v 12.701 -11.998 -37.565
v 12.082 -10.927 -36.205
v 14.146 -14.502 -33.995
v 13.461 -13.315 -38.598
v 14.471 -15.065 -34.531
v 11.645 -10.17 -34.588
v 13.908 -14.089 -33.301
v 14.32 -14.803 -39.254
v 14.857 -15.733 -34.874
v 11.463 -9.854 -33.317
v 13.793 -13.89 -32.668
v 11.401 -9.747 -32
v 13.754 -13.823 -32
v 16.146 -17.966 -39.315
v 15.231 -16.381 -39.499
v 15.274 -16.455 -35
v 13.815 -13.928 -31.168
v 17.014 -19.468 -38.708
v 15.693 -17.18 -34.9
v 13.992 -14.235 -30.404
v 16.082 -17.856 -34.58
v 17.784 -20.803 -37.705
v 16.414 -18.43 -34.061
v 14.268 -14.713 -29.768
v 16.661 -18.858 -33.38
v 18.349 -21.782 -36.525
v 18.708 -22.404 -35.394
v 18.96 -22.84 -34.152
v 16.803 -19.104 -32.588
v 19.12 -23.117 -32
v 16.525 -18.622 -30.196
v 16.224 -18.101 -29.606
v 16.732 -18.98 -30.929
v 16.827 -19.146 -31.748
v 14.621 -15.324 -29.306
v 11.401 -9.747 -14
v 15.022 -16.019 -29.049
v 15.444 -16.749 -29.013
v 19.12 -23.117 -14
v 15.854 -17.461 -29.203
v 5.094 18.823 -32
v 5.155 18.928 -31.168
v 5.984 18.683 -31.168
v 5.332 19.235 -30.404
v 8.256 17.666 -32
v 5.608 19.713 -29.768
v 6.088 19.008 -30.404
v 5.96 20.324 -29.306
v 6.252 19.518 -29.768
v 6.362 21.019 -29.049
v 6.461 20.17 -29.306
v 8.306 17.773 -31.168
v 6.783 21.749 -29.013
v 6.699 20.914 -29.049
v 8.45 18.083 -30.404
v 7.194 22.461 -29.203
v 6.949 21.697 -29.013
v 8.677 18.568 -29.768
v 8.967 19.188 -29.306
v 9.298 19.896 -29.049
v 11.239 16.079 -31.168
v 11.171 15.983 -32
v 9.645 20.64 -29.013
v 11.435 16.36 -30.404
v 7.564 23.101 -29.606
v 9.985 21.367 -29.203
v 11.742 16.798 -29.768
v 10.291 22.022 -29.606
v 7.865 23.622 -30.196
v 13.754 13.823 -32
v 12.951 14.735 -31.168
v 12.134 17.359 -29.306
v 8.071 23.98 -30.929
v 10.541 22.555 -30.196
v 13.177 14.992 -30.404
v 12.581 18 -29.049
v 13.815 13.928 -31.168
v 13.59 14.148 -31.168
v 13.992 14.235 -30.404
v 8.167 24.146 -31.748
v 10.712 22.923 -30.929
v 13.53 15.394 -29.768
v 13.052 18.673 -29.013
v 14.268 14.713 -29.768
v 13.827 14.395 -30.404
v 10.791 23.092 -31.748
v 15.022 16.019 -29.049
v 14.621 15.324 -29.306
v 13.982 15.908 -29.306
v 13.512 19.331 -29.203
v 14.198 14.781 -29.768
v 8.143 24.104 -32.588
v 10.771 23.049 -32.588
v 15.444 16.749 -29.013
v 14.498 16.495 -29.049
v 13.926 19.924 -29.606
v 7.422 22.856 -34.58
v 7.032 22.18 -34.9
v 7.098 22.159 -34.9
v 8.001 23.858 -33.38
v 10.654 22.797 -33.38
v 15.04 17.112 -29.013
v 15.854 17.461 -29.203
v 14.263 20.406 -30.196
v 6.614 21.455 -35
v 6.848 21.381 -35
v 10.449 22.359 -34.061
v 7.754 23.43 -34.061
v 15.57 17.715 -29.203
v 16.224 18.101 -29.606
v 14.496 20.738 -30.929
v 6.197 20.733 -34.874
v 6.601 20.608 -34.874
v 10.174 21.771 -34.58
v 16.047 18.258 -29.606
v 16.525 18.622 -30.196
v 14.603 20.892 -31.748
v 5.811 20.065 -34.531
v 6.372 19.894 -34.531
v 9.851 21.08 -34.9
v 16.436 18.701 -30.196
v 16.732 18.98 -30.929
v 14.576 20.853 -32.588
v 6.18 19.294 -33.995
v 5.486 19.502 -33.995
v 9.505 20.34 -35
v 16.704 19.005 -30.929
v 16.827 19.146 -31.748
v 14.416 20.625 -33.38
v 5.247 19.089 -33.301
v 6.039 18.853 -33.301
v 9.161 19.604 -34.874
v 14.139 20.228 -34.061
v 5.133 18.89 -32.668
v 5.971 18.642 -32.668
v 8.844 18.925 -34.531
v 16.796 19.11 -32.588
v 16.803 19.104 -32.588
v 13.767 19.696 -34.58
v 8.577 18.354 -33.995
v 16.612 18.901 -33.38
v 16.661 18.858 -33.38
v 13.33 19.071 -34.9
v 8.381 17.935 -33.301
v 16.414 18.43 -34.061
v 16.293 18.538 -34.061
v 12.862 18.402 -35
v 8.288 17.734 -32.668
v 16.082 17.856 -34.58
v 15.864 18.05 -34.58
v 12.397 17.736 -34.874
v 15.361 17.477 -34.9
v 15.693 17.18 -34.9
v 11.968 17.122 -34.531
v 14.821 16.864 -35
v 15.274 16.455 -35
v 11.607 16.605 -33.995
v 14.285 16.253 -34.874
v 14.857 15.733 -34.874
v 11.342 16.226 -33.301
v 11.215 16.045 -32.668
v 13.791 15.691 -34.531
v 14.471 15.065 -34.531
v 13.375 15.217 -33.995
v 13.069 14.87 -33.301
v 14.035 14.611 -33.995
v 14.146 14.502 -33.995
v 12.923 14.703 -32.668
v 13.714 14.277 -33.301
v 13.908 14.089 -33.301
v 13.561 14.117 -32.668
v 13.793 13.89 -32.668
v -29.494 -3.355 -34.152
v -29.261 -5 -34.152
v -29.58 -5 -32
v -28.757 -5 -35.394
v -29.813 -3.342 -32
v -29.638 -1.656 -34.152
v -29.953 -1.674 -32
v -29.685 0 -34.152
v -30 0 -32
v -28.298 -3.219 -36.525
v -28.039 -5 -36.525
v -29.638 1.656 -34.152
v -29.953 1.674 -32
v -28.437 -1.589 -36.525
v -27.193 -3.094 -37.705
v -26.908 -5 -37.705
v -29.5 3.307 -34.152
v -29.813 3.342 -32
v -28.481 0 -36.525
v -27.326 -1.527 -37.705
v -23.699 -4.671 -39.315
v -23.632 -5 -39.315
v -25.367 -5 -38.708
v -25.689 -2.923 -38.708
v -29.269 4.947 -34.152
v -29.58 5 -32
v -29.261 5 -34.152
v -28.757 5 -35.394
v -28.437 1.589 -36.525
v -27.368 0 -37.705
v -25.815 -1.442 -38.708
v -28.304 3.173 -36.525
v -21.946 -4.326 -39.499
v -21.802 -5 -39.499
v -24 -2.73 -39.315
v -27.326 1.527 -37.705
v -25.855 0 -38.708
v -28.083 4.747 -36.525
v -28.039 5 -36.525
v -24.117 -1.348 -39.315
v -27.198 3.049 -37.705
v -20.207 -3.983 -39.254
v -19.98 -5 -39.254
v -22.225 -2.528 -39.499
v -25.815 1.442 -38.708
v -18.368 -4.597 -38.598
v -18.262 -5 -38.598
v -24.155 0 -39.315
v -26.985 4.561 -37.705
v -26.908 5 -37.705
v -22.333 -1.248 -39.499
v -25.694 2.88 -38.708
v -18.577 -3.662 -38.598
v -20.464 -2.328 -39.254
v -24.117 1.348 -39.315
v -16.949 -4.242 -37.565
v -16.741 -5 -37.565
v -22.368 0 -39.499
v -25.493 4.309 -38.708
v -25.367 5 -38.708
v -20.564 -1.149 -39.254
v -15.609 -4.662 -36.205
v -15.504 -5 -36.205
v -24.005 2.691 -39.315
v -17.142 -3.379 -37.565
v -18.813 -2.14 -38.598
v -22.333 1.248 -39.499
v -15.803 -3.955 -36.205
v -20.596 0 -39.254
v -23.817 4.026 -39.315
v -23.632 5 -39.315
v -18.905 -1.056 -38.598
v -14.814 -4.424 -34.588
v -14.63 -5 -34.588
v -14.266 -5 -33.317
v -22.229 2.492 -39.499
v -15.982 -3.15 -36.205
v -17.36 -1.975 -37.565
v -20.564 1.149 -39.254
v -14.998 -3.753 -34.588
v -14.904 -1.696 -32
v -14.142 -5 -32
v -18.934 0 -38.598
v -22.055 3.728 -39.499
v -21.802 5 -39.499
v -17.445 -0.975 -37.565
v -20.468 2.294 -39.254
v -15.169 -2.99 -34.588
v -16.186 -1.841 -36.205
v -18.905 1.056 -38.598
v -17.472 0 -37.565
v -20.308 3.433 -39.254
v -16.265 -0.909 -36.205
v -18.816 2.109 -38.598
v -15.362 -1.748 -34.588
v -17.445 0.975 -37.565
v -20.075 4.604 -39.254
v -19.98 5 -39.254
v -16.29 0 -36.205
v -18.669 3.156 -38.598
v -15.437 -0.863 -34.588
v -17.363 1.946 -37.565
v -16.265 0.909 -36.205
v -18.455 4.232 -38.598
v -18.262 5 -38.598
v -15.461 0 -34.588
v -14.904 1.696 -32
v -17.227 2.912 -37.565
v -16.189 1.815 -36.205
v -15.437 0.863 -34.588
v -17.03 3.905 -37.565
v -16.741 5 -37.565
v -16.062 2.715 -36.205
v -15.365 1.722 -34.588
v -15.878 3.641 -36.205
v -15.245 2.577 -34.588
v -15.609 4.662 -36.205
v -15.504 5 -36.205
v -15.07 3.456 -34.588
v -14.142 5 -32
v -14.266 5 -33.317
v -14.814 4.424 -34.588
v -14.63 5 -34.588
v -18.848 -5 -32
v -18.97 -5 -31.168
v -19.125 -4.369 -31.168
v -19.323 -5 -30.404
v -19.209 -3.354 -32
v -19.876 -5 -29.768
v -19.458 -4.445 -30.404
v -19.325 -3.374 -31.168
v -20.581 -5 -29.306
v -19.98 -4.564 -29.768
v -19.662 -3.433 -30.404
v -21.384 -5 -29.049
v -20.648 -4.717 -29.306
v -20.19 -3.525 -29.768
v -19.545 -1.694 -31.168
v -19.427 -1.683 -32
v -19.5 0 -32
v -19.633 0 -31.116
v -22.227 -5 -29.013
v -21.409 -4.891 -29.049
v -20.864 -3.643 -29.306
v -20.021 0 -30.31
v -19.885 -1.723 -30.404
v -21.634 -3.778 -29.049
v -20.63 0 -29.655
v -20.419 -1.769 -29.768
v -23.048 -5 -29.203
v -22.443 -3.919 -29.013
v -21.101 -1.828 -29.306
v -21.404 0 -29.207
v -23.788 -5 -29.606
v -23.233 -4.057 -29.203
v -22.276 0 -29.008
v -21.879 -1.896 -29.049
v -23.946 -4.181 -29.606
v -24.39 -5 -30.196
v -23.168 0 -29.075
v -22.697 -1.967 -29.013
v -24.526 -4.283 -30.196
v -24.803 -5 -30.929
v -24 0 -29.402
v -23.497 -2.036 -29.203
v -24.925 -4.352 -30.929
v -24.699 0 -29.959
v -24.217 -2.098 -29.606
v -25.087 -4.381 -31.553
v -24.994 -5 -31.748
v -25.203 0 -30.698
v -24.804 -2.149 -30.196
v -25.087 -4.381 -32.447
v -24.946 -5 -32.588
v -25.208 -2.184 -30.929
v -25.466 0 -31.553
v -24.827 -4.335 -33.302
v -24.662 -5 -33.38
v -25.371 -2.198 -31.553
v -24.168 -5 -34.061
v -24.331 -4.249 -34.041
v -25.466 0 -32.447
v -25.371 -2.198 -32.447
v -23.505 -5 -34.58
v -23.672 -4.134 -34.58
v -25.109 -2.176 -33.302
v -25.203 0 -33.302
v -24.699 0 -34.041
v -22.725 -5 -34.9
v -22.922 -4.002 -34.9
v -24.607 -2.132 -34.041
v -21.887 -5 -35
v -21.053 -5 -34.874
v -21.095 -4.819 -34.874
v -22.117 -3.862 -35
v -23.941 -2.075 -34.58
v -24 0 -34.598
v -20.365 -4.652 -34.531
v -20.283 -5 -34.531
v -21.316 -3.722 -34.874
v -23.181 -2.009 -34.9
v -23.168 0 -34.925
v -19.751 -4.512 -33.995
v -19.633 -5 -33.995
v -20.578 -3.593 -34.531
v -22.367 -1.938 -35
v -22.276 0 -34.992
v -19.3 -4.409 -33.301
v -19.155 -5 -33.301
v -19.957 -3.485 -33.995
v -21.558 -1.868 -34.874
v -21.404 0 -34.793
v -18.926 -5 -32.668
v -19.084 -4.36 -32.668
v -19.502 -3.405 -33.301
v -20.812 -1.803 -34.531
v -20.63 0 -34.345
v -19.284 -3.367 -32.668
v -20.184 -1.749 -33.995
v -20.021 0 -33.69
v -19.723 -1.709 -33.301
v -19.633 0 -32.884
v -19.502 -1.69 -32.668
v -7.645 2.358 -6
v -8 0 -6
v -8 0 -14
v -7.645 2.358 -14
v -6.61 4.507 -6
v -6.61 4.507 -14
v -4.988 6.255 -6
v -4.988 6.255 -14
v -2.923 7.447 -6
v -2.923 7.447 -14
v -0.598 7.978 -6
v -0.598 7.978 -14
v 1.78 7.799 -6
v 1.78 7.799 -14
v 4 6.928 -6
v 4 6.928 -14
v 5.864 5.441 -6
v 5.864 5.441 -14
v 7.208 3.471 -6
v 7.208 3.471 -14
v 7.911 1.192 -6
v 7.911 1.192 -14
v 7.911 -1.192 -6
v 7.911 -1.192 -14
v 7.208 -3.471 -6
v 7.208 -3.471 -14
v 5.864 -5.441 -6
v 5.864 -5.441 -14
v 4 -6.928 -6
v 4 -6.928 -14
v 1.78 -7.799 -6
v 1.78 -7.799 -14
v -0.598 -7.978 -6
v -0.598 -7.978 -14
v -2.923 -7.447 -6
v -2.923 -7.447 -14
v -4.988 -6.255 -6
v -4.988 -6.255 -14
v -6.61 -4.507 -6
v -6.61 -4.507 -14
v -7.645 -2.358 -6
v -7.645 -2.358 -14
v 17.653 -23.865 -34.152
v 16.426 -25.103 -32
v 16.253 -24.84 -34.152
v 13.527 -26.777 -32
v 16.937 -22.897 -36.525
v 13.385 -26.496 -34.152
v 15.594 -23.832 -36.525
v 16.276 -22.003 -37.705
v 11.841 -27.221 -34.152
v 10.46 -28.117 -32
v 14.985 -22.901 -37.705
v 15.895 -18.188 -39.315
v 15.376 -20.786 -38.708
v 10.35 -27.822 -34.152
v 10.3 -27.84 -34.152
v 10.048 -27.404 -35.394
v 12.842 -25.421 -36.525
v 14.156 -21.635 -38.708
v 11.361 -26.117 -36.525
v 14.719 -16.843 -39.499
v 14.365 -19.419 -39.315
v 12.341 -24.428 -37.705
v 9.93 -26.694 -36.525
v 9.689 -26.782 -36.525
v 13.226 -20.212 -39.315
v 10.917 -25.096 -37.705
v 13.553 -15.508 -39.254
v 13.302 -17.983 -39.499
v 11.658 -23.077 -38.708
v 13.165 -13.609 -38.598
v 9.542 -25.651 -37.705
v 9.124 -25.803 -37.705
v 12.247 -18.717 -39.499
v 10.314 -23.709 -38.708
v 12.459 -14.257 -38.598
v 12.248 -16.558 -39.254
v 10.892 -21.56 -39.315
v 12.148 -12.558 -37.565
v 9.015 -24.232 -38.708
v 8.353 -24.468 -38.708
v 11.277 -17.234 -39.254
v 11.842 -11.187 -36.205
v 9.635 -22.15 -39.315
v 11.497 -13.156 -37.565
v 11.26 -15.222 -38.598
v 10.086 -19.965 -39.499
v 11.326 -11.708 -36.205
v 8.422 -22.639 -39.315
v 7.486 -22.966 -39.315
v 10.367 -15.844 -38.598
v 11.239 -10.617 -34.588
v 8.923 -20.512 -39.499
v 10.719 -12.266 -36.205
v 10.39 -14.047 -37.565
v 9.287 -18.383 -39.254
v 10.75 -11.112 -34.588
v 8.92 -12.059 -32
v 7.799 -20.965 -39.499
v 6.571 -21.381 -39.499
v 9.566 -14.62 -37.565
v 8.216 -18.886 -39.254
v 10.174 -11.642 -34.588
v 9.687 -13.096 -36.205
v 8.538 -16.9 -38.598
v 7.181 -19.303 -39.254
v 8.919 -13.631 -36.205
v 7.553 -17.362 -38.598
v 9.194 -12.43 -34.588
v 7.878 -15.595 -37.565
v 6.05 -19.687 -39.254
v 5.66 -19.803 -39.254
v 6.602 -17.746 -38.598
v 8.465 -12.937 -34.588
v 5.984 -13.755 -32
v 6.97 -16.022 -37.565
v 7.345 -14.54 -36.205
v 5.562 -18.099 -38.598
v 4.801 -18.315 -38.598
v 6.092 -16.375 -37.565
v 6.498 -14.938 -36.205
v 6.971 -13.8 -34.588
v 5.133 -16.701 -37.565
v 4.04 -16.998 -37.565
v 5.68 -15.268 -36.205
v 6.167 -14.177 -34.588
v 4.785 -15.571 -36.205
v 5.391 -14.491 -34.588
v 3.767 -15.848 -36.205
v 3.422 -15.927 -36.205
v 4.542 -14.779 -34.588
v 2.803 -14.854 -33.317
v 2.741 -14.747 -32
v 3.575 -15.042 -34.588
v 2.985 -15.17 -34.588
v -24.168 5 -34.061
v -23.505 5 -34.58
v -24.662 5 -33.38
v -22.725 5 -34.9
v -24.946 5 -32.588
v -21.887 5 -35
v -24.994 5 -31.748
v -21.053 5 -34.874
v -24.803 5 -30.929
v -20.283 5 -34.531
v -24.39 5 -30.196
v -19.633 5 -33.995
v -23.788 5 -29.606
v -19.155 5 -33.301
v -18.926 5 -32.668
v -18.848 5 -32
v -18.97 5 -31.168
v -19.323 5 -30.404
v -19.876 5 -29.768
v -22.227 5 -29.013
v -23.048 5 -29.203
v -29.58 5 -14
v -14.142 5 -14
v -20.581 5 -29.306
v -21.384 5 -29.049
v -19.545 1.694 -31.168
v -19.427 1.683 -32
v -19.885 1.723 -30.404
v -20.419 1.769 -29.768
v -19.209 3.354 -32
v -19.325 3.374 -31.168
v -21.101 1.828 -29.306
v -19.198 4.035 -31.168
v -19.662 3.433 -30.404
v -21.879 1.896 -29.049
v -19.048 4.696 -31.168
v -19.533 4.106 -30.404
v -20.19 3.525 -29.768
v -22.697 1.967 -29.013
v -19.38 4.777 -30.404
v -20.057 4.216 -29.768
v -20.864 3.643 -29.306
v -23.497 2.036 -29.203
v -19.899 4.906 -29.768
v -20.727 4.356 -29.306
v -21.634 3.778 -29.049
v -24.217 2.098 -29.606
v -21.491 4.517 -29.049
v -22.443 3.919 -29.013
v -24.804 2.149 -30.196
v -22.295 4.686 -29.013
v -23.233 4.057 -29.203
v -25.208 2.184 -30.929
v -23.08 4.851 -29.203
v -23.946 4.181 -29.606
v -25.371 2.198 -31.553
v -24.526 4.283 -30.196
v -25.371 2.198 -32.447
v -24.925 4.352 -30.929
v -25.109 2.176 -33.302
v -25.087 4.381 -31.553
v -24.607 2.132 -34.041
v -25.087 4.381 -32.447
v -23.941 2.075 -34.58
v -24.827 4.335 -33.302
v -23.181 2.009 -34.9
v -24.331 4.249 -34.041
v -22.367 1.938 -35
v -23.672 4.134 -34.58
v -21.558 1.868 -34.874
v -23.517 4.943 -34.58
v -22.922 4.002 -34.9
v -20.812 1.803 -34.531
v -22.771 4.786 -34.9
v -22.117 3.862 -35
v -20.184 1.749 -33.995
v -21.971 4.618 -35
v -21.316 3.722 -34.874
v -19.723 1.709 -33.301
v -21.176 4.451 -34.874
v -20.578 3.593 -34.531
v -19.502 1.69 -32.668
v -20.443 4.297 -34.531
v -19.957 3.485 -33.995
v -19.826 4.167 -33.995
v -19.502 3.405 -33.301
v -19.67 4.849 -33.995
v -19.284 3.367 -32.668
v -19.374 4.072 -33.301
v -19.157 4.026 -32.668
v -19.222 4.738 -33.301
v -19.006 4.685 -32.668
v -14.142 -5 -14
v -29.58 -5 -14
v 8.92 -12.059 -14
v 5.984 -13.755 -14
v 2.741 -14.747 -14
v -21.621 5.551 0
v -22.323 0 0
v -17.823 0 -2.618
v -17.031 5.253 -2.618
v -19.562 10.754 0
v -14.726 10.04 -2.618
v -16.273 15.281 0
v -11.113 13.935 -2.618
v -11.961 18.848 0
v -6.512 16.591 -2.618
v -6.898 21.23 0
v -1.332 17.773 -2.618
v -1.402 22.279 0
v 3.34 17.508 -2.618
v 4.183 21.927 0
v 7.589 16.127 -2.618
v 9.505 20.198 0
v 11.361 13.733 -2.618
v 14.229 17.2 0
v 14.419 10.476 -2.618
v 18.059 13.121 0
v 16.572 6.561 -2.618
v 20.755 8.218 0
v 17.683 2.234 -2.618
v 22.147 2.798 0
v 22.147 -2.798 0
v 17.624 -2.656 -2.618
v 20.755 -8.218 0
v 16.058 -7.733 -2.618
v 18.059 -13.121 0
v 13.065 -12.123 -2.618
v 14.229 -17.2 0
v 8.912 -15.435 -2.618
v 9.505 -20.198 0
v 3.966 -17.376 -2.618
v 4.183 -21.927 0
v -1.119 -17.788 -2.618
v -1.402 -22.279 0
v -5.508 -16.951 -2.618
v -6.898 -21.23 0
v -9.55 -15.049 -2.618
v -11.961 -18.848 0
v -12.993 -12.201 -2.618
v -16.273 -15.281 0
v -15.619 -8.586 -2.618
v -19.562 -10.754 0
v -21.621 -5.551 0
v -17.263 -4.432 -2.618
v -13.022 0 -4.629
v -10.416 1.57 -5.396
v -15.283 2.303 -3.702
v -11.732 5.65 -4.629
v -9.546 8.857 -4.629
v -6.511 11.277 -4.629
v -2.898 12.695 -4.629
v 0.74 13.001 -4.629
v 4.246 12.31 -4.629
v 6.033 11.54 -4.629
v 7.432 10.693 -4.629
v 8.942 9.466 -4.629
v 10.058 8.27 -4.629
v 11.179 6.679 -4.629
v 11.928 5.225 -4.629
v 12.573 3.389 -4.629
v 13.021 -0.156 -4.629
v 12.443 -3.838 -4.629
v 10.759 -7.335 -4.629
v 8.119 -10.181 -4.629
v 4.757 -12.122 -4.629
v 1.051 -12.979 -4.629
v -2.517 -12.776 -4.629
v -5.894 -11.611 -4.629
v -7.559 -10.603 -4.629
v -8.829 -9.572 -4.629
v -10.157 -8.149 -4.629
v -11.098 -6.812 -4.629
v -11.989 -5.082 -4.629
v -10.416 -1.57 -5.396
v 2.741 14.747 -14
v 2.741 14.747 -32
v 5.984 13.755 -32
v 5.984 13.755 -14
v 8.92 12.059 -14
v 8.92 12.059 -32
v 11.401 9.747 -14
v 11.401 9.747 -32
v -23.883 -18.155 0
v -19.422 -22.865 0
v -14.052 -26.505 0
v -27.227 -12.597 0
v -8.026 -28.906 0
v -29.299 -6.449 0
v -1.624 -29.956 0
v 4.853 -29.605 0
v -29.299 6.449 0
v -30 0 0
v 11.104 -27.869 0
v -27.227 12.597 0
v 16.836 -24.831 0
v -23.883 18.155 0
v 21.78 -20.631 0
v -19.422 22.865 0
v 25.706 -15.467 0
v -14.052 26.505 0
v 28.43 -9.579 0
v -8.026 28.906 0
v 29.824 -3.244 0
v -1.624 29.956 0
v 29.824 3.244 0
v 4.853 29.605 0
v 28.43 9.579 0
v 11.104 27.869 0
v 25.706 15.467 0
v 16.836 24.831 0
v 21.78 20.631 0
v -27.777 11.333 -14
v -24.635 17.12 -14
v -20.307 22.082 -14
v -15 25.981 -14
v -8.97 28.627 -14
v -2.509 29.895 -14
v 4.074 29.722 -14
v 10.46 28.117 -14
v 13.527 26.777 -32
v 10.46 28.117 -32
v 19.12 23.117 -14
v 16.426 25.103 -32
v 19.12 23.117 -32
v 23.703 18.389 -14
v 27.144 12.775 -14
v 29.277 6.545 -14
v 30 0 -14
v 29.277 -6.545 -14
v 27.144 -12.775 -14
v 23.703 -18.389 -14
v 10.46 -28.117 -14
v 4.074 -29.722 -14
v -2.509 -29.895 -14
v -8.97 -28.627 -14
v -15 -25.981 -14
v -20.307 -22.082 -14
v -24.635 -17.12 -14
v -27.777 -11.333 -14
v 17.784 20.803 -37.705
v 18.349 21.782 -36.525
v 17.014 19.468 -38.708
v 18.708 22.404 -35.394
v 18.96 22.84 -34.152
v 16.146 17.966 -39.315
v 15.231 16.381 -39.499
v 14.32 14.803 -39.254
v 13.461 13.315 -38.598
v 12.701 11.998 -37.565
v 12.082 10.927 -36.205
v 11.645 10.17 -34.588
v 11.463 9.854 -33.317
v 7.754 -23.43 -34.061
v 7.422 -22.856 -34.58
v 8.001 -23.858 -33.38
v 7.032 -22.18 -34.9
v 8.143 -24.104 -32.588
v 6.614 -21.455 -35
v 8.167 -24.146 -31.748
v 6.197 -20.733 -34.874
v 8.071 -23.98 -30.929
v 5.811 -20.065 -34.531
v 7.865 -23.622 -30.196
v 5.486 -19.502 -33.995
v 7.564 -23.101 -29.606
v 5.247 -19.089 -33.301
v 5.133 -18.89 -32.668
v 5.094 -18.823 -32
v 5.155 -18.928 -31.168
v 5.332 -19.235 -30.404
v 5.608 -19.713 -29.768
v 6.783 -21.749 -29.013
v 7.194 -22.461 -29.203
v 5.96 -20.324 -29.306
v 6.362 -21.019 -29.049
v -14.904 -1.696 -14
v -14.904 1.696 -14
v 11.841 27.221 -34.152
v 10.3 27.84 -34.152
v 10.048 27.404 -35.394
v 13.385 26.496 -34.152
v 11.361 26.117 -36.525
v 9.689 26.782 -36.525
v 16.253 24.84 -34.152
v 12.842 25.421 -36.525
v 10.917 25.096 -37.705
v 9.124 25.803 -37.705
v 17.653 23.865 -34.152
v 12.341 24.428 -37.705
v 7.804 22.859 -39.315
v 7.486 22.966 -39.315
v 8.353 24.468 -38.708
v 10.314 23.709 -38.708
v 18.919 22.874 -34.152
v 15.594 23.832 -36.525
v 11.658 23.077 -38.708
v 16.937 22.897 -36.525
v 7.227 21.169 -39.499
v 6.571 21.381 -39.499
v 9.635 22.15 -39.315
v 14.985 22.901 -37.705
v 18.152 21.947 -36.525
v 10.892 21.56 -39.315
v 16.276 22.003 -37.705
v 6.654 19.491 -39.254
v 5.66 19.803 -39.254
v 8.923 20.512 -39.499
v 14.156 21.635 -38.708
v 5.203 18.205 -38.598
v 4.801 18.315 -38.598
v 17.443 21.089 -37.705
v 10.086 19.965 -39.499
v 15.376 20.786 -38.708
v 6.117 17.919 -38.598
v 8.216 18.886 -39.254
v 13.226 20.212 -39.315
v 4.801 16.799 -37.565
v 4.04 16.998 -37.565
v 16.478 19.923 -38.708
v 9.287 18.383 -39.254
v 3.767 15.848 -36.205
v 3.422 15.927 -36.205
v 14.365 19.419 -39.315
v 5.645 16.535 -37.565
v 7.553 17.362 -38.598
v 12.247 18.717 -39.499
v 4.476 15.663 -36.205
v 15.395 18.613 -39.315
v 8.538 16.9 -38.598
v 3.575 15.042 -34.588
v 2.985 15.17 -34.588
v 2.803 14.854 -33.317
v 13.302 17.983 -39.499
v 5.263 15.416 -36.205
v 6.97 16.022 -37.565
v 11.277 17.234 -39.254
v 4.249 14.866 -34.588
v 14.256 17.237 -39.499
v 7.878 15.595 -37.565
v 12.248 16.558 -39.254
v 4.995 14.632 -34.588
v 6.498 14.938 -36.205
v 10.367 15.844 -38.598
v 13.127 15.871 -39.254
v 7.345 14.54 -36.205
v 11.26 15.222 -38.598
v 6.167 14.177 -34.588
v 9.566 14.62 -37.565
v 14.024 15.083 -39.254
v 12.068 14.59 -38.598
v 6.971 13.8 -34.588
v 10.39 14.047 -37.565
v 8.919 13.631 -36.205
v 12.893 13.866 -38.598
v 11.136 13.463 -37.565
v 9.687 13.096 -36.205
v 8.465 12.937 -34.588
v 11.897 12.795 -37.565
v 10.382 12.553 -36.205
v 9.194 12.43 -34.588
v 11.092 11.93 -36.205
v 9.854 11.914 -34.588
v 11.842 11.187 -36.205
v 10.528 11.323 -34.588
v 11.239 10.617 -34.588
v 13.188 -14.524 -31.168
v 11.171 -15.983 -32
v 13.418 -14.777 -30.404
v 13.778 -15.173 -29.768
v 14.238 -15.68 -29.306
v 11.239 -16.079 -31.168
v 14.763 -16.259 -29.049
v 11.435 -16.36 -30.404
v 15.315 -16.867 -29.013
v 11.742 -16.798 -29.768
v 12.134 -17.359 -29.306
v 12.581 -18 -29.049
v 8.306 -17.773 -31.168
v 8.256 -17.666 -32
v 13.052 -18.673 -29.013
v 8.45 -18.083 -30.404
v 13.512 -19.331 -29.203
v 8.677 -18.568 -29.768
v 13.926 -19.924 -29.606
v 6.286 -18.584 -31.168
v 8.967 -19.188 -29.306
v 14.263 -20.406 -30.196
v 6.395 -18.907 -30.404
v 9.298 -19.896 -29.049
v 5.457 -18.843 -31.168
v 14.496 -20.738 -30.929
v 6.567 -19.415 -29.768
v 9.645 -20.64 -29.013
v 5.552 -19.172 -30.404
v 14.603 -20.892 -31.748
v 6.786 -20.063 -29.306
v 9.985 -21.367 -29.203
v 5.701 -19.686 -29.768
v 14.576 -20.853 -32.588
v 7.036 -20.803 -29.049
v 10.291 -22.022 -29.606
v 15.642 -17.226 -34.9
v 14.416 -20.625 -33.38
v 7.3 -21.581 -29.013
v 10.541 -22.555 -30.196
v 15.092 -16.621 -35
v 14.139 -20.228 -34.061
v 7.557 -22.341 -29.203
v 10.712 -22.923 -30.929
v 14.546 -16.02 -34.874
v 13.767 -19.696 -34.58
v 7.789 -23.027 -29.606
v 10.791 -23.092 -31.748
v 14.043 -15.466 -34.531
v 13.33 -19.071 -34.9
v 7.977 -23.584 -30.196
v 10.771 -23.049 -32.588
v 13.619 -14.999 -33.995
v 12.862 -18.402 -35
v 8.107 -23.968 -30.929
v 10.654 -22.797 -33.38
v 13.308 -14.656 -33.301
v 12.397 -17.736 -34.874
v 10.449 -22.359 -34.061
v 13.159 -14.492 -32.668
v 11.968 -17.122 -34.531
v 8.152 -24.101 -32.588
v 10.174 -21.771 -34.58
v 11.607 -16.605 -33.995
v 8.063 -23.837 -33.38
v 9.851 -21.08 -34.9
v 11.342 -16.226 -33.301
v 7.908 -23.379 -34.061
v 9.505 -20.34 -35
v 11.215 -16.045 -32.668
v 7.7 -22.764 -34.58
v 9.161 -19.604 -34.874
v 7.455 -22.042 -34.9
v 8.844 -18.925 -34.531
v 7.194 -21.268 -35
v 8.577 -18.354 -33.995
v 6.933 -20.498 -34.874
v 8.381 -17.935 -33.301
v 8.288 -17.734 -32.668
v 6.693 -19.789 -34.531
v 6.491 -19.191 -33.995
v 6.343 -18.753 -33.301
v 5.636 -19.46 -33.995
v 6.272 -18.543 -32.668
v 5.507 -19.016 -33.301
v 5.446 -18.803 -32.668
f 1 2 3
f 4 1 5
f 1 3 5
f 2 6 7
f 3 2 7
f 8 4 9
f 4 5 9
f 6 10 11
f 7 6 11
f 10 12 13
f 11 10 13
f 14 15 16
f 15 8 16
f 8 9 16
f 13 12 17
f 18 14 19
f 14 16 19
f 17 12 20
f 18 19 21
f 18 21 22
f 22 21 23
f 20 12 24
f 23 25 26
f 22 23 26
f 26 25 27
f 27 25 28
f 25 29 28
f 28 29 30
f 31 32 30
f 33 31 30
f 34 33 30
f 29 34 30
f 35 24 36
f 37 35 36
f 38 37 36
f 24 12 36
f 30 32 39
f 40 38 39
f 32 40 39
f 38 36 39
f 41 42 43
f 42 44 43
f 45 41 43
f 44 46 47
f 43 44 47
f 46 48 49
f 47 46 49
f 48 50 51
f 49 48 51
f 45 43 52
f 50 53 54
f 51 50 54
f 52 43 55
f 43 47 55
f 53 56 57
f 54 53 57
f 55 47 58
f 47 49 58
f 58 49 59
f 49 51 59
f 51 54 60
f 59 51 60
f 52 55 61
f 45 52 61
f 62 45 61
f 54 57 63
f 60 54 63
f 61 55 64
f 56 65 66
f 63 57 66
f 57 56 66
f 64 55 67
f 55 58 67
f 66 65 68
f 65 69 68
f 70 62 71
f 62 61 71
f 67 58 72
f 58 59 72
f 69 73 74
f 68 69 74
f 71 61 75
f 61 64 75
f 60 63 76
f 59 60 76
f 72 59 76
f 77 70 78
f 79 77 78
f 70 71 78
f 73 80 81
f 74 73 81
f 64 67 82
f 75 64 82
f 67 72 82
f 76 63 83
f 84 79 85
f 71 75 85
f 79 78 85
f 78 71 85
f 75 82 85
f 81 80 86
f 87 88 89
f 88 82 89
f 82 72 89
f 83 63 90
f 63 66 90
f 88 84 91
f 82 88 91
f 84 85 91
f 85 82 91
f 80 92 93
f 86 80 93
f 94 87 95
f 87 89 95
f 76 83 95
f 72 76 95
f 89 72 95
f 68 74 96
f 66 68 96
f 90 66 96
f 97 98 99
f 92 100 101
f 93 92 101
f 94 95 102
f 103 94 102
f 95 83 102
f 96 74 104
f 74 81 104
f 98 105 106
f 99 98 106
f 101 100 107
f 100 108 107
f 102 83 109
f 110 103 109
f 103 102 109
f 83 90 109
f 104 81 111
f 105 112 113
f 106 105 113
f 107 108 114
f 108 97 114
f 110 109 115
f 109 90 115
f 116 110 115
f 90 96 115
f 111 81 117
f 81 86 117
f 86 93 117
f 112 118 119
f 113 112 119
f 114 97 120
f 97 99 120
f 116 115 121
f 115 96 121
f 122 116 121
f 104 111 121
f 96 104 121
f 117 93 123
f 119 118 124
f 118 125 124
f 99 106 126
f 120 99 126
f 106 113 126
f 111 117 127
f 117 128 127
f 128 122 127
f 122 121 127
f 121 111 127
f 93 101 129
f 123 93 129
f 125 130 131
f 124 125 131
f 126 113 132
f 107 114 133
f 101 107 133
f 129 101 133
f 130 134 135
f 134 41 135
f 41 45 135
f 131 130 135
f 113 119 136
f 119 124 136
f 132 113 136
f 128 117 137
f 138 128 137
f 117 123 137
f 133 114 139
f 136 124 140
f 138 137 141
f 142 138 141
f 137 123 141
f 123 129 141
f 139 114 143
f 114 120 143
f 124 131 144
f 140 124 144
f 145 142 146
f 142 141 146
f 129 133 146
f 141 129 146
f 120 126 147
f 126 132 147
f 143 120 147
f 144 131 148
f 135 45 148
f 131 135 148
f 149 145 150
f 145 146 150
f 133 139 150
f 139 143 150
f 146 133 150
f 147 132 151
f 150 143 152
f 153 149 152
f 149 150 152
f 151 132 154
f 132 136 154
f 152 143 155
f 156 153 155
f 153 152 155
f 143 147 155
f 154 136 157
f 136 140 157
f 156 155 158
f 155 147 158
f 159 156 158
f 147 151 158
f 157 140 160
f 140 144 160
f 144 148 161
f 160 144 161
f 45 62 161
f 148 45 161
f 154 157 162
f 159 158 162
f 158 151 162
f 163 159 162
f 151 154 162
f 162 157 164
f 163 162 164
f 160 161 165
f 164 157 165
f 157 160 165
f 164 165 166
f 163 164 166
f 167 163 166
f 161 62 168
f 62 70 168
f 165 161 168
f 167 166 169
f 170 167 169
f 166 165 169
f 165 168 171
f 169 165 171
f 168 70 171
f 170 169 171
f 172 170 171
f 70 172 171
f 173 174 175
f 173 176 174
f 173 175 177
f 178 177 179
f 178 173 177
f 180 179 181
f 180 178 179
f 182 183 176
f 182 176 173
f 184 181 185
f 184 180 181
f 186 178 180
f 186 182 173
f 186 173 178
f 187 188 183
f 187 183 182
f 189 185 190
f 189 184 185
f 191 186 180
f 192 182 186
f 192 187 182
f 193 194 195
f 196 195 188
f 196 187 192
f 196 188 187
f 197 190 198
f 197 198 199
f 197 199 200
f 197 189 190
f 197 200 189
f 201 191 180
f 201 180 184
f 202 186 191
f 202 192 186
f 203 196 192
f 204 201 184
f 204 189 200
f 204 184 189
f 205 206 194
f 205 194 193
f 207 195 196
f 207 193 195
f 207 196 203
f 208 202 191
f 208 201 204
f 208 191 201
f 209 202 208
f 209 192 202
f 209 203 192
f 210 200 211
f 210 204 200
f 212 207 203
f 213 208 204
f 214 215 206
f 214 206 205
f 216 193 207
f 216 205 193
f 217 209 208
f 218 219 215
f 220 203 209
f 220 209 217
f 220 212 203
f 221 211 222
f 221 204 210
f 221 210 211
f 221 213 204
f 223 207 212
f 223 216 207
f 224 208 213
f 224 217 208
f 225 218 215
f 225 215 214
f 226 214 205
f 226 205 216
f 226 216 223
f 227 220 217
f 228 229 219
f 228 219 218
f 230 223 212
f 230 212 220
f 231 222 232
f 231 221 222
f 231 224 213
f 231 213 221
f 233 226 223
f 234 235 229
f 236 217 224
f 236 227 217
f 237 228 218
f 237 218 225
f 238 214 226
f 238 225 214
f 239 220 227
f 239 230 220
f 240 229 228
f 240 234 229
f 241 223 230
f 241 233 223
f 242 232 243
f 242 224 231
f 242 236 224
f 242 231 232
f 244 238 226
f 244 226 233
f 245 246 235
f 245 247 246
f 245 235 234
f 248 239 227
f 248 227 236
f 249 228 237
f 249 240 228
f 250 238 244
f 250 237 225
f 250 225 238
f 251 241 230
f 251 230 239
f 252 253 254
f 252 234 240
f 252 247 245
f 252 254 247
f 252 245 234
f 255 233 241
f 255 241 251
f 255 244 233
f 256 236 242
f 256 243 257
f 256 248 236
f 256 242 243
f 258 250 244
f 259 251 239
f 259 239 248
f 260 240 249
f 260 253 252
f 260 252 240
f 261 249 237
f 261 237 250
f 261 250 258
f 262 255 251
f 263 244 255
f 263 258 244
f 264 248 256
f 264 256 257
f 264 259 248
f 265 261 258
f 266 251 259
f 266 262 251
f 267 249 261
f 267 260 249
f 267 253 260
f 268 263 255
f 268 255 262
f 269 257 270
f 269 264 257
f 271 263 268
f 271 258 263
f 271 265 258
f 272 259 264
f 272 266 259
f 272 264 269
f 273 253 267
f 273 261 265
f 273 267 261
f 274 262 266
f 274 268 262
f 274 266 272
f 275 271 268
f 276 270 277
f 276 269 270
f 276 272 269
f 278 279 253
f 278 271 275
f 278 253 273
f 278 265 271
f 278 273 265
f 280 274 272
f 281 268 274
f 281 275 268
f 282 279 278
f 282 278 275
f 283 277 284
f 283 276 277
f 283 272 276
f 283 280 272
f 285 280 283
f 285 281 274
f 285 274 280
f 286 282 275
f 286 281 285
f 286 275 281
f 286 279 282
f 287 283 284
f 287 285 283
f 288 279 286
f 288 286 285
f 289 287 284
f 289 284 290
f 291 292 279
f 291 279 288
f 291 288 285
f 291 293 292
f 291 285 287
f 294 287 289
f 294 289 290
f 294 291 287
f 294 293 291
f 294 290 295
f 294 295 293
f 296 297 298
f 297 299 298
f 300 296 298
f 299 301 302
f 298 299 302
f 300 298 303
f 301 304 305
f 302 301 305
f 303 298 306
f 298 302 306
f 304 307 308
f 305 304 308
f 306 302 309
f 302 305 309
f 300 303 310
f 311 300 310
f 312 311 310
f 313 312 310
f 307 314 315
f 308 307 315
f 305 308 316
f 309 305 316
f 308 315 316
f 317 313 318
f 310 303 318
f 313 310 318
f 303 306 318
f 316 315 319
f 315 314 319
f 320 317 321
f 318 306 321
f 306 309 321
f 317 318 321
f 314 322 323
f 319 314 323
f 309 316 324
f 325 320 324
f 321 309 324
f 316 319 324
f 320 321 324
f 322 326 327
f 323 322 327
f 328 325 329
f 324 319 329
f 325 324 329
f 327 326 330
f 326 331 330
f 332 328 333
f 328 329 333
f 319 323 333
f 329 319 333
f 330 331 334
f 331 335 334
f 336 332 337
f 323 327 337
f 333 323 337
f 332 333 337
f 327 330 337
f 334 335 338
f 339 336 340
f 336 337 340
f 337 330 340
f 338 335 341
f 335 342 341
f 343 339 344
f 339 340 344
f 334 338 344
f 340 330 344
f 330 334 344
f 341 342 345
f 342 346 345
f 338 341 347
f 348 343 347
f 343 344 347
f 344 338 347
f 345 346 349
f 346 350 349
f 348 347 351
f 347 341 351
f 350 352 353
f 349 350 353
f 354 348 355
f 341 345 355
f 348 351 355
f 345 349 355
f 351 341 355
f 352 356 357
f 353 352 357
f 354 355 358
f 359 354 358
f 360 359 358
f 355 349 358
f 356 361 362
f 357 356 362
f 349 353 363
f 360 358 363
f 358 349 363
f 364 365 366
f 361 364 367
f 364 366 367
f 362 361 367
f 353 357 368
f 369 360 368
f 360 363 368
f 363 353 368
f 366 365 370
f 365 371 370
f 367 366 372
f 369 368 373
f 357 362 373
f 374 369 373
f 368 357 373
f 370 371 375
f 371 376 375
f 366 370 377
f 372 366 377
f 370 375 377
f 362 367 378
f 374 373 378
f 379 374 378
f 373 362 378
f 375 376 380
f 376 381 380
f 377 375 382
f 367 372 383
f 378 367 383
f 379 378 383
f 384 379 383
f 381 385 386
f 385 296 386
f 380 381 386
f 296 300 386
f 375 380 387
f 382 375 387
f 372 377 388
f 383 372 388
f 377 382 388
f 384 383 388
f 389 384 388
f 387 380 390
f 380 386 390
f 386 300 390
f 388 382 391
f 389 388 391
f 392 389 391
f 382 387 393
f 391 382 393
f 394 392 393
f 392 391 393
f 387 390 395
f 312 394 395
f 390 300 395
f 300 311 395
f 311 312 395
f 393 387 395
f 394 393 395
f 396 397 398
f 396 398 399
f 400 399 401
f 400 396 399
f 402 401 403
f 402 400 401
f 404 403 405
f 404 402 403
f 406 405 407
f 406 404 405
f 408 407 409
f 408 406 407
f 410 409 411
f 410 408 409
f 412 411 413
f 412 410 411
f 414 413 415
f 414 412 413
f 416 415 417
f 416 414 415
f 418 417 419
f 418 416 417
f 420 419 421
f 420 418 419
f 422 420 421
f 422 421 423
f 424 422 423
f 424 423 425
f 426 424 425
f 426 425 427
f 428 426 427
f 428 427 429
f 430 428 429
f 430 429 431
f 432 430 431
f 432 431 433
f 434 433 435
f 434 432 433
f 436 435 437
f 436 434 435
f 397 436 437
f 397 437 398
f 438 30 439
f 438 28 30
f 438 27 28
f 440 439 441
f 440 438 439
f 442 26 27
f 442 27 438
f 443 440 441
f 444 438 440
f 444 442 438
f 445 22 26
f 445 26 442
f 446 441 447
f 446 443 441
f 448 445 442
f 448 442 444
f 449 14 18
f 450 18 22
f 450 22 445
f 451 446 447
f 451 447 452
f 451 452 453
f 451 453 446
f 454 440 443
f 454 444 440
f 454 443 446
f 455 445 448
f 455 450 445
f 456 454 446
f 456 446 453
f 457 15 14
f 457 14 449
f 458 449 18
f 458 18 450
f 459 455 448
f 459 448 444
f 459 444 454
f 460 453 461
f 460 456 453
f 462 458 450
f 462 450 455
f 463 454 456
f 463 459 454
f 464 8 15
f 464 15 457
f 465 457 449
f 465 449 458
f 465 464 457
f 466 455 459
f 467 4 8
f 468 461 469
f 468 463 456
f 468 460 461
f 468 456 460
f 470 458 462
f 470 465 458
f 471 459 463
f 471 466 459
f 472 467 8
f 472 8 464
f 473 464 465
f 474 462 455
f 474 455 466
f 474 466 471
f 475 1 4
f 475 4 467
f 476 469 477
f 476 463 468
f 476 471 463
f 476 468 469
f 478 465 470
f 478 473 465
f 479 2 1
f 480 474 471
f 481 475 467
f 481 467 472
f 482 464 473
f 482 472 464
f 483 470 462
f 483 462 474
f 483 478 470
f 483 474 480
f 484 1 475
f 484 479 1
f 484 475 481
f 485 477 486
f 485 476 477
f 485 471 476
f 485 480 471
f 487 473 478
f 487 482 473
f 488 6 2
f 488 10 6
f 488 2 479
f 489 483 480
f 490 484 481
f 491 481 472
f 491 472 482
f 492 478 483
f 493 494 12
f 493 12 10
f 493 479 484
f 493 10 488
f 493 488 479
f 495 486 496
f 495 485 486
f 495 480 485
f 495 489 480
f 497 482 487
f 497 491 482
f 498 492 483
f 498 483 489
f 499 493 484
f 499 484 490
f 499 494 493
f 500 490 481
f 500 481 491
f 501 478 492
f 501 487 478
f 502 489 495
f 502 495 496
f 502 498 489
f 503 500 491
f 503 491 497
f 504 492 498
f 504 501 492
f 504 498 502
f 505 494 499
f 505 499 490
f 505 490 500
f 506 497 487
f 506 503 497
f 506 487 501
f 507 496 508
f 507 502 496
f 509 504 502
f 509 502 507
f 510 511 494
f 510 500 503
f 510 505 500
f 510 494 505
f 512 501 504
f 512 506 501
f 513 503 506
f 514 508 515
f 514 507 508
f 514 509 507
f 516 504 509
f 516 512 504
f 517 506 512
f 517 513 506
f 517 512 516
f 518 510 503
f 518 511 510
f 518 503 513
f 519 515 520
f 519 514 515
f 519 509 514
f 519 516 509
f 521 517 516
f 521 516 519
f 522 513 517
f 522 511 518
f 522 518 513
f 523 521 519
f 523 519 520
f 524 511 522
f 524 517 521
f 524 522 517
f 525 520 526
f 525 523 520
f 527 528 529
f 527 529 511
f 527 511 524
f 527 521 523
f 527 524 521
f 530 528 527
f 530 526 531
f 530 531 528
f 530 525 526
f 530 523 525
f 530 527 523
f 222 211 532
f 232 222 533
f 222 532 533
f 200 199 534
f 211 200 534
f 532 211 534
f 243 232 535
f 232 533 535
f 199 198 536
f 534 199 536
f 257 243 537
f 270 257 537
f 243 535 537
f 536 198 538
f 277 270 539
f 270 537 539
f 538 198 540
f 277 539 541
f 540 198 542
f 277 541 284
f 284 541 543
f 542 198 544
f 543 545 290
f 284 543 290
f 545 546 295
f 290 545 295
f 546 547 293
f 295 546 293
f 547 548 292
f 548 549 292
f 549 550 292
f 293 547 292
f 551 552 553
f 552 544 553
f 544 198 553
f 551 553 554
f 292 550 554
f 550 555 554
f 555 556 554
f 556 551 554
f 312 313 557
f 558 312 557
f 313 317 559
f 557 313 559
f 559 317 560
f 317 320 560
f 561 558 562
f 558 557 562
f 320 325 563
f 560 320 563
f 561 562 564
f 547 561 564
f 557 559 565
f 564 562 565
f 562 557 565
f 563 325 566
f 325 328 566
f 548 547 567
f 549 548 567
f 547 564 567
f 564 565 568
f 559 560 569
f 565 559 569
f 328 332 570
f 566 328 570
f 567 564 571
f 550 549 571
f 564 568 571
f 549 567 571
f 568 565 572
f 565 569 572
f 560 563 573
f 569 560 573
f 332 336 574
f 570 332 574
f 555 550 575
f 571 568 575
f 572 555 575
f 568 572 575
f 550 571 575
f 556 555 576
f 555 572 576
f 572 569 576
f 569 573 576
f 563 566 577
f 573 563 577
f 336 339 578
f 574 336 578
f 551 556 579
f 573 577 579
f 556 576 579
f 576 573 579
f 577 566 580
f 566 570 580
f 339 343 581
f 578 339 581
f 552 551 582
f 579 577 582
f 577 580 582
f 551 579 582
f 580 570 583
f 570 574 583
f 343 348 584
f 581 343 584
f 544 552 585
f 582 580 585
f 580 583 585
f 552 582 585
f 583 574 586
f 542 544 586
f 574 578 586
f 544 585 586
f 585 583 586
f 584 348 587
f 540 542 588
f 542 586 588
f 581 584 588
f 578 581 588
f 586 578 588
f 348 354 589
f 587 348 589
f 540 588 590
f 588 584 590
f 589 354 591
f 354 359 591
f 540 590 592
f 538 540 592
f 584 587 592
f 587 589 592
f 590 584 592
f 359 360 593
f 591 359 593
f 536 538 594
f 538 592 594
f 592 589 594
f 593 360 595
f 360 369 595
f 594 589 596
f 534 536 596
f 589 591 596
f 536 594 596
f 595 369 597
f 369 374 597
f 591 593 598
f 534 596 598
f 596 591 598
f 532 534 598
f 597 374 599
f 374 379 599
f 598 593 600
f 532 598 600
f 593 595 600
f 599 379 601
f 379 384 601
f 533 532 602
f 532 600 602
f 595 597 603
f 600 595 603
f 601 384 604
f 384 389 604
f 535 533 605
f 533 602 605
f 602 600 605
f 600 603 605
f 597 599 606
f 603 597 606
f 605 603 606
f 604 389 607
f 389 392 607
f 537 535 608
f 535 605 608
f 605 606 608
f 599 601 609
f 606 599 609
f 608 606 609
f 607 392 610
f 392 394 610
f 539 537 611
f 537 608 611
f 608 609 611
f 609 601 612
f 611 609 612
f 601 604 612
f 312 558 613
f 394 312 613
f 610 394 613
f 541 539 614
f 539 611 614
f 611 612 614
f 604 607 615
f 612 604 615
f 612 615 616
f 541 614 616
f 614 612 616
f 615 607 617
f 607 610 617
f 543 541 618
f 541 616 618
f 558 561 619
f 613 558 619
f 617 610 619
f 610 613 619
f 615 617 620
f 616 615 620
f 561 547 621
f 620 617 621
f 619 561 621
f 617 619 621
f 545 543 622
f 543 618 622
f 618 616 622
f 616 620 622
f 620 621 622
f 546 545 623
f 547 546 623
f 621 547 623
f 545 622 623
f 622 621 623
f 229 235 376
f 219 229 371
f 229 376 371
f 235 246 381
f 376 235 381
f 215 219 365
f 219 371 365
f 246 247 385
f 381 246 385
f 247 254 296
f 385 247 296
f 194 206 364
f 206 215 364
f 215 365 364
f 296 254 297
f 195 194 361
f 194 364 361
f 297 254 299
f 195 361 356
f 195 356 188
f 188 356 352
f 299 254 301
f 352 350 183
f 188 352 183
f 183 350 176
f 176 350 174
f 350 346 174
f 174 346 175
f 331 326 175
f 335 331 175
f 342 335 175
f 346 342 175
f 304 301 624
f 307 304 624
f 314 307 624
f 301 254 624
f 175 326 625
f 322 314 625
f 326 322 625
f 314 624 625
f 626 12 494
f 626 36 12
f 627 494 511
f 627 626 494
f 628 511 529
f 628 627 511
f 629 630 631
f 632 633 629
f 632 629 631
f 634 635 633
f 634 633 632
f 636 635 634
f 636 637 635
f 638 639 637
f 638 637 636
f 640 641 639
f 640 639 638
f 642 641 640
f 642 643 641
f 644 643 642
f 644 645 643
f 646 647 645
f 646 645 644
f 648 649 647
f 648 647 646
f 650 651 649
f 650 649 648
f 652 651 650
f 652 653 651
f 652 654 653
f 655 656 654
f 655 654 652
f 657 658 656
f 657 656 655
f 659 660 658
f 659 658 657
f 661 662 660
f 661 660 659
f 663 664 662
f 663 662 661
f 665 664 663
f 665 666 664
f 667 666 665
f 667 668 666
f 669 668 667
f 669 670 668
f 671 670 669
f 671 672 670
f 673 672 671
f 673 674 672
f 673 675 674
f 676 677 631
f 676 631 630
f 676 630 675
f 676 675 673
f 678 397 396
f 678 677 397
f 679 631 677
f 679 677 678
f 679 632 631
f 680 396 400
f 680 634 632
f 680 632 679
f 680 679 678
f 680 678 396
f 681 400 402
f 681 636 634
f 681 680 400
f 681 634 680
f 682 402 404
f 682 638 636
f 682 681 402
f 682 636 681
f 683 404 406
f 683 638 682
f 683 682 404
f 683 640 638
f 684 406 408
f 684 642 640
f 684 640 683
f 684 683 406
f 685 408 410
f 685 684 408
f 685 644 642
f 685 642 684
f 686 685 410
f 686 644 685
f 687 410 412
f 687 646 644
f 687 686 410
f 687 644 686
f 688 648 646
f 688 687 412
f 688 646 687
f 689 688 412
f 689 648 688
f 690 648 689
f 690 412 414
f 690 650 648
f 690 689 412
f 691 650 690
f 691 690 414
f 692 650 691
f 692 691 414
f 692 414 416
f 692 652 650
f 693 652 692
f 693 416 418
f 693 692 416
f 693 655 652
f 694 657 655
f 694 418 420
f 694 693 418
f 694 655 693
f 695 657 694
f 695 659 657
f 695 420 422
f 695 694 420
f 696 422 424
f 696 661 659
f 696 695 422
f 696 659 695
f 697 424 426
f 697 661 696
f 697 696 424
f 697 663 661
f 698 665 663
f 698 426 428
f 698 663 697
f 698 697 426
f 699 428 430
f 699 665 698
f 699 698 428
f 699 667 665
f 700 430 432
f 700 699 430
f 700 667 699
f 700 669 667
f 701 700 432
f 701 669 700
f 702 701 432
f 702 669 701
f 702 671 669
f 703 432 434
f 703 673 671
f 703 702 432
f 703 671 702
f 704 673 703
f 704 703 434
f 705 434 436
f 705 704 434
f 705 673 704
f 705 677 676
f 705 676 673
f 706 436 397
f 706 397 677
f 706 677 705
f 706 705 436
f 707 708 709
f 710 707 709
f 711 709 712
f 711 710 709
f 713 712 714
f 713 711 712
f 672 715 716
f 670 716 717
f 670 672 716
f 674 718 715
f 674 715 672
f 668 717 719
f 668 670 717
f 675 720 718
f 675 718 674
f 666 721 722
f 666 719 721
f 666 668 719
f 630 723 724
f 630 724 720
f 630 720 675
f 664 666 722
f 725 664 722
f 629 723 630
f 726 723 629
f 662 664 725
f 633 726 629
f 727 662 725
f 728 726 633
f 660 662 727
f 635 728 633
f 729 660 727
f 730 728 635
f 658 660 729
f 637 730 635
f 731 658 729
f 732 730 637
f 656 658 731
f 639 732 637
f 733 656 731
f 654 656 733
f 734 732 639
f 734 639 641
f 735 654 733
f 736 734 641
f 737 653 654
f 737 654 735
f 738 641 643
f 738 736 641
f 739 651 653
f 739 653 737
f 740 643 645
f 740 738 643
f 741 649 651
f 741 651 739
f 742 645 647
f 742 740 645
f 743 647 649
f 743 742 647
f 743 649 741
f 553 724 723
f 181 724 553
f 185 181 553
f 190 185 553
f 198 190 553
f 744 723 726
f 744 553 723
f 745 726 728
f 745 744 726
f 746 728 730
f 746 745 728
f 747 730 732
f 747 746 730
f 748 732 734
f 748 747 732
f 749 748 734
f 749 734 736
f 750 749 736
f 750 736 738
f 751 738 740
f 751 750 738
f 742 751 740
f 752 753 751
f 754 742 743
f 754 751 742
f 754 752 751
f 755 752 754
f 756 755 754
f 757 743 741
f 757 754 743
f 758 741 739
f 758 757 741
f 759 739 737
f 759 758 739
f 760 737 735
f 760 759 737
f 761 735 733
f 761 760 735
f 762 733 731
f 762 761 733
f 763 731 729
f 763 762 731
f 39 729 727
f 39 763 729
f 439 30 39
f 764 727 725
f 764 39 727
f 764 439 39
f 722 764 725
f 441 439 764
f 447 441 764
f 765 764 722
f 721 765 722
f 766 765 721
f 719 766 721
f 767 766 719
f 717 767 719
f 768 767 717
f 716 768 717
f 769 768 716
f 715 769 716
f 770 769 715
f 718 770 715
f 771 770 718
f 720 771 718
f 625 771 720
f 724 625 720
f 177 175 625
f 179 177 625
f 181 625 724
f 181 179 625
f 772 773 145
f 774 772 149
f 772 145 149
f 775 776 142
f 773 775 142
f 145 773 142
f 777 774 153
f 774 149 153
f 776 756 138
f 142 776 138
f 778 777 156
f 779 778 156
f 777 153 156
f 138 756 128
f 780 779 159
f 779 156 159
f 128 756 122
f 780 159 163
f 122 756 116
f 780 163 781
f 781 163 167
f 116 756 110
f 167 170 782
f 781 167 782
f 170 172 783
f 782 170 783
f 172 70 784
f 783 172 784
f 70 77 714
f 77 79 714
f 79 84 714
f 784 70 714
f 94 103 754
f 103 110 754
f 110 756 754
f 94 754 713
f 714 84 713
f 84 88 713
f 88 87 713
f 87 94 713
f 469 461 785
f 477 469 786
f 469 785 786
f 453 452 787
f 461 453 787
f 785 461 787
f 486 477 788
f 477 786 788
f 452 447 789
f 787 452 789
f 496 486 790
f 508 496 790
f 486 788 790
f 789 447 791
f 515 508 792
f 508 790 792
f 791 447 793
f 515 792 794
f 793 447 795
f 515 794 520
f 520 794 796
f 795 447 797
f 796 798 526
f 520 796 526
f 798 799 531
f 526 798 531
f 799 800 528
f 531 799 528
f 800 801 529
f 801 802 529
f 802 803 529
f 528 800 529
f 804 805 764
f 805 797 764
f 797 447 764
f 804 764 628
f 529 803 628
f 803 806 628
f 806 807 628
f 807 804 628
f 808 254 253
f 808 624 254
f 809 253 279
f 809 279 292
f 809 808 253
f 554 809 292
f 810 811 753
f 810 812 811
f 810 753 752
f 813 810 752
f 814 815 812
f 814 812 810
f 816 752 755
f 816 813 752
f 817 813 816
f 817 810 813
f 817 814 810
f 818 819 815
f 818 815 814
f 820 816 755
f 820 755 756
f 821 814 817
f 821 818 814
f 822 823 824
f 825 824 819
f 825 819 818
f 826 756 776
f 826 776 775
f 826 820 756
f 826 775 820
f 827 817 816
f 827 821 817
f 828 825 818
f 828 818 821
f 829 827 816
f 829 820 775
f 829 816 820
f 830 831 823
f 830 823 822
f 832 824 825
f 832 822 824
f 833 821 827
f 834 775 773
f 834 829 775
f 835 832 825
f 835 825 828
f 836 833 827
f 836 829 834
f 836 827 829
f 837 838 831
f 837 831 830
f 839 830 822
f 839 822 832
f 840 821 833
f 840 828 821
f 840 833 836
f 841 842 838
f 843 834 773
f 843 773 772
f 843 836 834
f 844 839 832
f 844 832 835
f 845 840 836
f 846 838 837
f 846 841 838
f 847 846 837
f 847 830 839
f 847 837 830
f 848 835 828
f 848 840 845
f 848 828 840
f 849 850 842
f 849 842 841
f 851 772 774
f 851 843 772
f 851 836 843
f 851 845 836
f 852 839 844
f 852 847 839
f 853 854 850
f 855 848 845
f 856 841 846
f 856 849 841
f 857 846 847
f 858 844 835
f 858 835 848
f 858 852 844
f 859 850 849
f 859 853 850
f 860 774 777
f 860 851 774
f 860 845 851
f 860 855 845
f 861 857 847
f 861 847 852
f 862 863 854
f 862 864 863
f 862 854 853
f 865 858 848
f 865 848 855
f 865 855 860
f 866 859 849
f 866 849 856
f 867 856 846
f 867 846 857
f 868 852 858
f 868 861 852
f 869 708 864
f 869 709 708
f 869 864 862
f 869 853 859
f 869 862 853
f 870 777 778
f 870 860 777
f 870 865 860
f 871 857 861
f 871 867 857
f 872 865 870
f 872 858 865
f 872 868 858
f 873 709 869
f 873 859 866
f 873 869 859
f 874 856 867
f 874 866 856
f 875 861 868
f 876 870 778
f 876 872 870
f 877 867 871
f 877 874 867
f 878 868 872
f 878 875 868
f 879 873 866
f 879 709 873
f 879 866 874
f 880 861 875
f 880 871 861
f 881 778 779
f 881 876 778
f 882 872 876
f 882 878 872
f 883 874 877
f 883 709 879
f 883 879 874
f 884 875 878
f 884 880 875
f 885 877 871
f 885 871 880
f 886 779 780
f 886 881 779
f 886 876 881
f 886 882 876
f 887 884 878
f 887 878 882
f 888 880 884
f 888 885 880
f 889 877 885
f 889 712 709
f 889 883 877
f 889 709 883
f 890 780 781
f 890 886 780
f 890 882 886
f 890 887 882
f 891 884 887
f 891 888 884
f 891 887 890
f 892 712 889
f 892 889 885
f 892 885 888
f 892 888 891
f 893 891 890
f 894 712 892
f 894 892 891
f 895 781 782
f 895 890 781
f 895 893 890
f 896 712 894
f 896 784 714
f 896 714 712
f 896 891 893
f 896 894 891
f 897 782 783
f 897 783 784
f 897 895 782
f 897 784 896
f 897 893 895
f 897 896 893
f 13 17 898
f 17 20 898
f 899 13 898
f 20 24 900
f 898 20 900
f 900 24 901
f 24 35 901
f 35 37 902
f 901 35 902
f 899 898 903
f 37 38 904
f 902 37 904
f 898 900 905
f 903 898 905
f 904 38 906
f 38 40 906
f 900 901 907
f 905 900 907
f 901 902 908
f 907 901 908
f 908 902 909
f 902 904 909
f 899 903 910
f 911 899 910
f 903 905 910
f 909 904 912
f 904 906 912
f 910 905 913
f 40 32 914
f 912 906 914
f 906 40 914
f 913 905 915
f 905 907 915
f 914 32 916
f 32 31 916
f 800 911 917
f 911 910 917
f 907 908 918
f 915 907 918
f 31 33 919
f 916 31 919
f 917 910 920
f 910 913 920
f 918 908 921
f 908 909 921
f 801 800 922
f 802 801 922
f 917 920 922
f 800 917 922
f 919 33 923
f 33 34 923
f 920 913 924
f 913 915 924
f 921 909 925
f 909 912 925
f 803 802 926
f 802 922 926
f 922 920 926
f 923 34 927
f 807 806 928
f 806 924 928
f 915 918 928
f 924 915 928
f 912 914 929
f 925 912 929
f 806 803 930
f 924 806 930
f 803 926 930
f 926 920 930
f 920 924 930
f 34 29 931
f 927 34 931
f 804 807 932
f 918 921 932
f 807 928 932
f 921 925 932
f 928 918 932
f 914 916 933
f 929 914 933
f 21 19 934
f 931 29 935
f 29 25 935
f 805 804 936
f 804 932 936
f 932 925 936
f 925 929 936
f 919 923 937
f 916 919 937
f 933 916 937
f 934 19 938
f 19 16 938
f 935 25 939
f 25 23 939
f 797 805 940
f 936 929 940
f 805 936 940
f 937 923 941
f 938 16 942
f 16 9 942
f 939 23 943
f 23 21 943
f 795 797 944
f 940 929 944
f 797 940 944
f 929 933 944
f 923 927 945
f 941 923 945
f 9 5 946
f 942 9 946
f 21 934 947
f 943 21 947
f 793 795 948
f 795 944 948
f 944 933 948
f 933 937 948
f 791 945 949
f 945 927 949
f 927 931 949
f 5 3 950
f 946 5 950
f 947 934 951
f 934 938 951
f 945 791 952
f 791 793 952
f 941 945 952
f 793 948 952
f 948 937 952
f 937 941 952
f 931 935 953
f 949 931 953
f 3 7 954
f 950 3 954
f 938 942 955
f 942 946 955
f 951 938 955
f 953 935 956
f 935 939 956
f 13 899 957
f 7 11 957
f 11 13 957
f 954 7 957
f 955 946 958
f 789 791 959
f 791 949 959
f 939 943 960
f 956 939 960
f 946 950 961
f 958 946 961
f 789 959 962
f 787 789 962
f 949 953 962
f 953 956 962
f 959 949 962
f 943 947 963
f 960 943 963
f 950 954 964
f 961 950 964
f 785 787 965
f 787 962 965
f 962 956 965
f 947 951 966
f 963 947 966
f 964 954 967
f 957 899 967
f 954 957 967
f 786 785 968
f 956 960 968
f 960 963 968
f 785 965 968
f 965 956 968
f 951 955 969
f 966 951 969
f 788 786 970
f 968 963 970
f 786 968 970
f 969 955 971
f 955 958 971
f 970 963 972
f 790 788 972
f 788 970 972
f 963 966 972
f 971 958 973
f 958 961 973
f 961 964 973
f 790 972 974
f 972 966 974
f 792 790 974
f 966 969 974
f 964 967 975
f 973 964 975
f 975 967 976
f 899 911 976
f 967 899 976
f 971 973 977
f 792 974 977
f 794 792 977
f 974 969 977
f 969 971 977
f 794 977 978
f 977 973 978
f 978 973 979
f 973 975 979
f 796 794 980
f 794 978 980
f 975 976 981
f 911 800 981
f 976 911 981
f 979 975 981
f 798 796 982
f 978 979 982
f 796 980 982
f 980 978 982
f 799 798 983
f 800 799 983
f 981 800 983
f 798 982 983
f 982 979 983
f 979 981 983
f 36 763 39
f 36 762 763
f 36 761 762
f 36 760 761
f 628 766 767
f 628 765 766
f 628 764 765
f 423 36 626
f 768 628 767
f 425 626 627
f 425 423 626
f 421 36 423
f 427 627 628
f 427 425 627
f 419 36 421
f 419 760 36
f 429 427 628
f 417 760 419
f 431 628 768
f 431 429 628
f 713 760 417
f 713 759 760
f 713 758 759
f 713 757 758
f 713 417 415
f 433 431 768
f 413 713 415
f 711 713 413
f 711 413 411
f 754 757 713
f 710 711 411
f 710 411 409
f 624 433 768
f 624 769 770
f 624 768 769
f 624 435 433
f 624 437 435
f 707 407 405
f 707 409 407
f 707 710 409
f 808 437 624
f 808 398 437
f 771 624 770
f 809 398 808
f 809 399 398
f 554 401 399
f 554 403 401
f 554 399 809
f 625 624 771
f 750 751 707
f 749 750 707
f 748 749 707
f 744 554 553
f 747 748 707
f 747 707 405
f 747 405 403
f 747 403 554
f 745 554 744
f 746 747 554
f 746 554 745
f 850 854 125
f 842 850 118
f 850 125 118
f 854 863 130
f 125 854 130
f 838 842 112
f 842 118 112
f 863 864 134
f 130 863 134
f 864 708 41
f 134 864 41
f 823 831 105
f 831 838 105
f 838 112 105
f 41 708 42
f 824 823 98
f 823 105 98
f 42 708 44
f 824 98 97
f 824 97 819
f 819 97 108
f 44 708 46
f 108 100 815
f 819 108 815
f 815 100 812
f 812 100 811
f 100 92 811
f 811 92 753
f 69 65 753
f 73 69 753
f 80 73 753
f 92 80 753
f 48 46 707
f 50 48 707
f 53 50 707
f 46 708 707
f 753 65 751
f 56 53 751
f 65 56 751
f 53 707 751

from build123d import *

# Parameters (mm, degrees)
F0_R     = 3
F5_DEPTH = 25.501


with BuildPart() as f2:
    # F0 (on Front) → F2 (revolve)
    with BuildSketch(Plane.XZ):
        with BuildLine():
            ThreePointArc((-8, -6), (-15.455298, -3.701711), (-22.32268, 0))
            Line((-22.32268, 0), (-30, 0))
            Line((-30, 0), (-30, -32))
            ThreePointArc((-30, -32), (-22.5, -39.5), (-15, -32))
            Line((-15, -32), (-15, -14))
            Line((-15, -14), (-8, -14))
            Line((-8, -14), (-8, -6))
        make_face()
        with Locations((-22.5, -32)):
            Circle(F0_R, mode=Mode.SUBTRACT)
    revolve(axis=Axis((0, 0, -7), (0, 0, -1)))

    # F4 (on offset) → F5 (cut, through all)
    with BuildSketch(Plane.XY.offset(-14)):
        with BuildLine():
            Line((-2.886751, 5), (10.460072, 28.117377))
            ThreePointArc((10.460072, 28.117377), (-15, 25.980762), (-29.580399, 5))
            Line((-29.580399, 5), (-2.886751, 5))
        make_face()
        with BuildLine():
            ThreePointArc((19.120326, -23.117377), (27.14415, -12.774784), (30, 0))
            ThreePointArc((30, 0), (27.14415, 12.774784), (19.120326, 23.117377))
            Line((19.120326, 23.117377), (5.773503, 0))
            Line((5.773503, 0), (19.120326, -23.117377))
        make_face()
        with BuildLine():
            ThreePointArc((-29.580399, -5), (-15, -25.980762), (10.460072, -28.117377))
            Line((10.460072, -28.117377), (-2.886751, -5))
            Line((-2.886751, -5), (-29.580399, -5))
        make_face()
    extrude(amount=-F5_DEPTH, mode=Mode.SUBTRACT)


solid = f2.part
